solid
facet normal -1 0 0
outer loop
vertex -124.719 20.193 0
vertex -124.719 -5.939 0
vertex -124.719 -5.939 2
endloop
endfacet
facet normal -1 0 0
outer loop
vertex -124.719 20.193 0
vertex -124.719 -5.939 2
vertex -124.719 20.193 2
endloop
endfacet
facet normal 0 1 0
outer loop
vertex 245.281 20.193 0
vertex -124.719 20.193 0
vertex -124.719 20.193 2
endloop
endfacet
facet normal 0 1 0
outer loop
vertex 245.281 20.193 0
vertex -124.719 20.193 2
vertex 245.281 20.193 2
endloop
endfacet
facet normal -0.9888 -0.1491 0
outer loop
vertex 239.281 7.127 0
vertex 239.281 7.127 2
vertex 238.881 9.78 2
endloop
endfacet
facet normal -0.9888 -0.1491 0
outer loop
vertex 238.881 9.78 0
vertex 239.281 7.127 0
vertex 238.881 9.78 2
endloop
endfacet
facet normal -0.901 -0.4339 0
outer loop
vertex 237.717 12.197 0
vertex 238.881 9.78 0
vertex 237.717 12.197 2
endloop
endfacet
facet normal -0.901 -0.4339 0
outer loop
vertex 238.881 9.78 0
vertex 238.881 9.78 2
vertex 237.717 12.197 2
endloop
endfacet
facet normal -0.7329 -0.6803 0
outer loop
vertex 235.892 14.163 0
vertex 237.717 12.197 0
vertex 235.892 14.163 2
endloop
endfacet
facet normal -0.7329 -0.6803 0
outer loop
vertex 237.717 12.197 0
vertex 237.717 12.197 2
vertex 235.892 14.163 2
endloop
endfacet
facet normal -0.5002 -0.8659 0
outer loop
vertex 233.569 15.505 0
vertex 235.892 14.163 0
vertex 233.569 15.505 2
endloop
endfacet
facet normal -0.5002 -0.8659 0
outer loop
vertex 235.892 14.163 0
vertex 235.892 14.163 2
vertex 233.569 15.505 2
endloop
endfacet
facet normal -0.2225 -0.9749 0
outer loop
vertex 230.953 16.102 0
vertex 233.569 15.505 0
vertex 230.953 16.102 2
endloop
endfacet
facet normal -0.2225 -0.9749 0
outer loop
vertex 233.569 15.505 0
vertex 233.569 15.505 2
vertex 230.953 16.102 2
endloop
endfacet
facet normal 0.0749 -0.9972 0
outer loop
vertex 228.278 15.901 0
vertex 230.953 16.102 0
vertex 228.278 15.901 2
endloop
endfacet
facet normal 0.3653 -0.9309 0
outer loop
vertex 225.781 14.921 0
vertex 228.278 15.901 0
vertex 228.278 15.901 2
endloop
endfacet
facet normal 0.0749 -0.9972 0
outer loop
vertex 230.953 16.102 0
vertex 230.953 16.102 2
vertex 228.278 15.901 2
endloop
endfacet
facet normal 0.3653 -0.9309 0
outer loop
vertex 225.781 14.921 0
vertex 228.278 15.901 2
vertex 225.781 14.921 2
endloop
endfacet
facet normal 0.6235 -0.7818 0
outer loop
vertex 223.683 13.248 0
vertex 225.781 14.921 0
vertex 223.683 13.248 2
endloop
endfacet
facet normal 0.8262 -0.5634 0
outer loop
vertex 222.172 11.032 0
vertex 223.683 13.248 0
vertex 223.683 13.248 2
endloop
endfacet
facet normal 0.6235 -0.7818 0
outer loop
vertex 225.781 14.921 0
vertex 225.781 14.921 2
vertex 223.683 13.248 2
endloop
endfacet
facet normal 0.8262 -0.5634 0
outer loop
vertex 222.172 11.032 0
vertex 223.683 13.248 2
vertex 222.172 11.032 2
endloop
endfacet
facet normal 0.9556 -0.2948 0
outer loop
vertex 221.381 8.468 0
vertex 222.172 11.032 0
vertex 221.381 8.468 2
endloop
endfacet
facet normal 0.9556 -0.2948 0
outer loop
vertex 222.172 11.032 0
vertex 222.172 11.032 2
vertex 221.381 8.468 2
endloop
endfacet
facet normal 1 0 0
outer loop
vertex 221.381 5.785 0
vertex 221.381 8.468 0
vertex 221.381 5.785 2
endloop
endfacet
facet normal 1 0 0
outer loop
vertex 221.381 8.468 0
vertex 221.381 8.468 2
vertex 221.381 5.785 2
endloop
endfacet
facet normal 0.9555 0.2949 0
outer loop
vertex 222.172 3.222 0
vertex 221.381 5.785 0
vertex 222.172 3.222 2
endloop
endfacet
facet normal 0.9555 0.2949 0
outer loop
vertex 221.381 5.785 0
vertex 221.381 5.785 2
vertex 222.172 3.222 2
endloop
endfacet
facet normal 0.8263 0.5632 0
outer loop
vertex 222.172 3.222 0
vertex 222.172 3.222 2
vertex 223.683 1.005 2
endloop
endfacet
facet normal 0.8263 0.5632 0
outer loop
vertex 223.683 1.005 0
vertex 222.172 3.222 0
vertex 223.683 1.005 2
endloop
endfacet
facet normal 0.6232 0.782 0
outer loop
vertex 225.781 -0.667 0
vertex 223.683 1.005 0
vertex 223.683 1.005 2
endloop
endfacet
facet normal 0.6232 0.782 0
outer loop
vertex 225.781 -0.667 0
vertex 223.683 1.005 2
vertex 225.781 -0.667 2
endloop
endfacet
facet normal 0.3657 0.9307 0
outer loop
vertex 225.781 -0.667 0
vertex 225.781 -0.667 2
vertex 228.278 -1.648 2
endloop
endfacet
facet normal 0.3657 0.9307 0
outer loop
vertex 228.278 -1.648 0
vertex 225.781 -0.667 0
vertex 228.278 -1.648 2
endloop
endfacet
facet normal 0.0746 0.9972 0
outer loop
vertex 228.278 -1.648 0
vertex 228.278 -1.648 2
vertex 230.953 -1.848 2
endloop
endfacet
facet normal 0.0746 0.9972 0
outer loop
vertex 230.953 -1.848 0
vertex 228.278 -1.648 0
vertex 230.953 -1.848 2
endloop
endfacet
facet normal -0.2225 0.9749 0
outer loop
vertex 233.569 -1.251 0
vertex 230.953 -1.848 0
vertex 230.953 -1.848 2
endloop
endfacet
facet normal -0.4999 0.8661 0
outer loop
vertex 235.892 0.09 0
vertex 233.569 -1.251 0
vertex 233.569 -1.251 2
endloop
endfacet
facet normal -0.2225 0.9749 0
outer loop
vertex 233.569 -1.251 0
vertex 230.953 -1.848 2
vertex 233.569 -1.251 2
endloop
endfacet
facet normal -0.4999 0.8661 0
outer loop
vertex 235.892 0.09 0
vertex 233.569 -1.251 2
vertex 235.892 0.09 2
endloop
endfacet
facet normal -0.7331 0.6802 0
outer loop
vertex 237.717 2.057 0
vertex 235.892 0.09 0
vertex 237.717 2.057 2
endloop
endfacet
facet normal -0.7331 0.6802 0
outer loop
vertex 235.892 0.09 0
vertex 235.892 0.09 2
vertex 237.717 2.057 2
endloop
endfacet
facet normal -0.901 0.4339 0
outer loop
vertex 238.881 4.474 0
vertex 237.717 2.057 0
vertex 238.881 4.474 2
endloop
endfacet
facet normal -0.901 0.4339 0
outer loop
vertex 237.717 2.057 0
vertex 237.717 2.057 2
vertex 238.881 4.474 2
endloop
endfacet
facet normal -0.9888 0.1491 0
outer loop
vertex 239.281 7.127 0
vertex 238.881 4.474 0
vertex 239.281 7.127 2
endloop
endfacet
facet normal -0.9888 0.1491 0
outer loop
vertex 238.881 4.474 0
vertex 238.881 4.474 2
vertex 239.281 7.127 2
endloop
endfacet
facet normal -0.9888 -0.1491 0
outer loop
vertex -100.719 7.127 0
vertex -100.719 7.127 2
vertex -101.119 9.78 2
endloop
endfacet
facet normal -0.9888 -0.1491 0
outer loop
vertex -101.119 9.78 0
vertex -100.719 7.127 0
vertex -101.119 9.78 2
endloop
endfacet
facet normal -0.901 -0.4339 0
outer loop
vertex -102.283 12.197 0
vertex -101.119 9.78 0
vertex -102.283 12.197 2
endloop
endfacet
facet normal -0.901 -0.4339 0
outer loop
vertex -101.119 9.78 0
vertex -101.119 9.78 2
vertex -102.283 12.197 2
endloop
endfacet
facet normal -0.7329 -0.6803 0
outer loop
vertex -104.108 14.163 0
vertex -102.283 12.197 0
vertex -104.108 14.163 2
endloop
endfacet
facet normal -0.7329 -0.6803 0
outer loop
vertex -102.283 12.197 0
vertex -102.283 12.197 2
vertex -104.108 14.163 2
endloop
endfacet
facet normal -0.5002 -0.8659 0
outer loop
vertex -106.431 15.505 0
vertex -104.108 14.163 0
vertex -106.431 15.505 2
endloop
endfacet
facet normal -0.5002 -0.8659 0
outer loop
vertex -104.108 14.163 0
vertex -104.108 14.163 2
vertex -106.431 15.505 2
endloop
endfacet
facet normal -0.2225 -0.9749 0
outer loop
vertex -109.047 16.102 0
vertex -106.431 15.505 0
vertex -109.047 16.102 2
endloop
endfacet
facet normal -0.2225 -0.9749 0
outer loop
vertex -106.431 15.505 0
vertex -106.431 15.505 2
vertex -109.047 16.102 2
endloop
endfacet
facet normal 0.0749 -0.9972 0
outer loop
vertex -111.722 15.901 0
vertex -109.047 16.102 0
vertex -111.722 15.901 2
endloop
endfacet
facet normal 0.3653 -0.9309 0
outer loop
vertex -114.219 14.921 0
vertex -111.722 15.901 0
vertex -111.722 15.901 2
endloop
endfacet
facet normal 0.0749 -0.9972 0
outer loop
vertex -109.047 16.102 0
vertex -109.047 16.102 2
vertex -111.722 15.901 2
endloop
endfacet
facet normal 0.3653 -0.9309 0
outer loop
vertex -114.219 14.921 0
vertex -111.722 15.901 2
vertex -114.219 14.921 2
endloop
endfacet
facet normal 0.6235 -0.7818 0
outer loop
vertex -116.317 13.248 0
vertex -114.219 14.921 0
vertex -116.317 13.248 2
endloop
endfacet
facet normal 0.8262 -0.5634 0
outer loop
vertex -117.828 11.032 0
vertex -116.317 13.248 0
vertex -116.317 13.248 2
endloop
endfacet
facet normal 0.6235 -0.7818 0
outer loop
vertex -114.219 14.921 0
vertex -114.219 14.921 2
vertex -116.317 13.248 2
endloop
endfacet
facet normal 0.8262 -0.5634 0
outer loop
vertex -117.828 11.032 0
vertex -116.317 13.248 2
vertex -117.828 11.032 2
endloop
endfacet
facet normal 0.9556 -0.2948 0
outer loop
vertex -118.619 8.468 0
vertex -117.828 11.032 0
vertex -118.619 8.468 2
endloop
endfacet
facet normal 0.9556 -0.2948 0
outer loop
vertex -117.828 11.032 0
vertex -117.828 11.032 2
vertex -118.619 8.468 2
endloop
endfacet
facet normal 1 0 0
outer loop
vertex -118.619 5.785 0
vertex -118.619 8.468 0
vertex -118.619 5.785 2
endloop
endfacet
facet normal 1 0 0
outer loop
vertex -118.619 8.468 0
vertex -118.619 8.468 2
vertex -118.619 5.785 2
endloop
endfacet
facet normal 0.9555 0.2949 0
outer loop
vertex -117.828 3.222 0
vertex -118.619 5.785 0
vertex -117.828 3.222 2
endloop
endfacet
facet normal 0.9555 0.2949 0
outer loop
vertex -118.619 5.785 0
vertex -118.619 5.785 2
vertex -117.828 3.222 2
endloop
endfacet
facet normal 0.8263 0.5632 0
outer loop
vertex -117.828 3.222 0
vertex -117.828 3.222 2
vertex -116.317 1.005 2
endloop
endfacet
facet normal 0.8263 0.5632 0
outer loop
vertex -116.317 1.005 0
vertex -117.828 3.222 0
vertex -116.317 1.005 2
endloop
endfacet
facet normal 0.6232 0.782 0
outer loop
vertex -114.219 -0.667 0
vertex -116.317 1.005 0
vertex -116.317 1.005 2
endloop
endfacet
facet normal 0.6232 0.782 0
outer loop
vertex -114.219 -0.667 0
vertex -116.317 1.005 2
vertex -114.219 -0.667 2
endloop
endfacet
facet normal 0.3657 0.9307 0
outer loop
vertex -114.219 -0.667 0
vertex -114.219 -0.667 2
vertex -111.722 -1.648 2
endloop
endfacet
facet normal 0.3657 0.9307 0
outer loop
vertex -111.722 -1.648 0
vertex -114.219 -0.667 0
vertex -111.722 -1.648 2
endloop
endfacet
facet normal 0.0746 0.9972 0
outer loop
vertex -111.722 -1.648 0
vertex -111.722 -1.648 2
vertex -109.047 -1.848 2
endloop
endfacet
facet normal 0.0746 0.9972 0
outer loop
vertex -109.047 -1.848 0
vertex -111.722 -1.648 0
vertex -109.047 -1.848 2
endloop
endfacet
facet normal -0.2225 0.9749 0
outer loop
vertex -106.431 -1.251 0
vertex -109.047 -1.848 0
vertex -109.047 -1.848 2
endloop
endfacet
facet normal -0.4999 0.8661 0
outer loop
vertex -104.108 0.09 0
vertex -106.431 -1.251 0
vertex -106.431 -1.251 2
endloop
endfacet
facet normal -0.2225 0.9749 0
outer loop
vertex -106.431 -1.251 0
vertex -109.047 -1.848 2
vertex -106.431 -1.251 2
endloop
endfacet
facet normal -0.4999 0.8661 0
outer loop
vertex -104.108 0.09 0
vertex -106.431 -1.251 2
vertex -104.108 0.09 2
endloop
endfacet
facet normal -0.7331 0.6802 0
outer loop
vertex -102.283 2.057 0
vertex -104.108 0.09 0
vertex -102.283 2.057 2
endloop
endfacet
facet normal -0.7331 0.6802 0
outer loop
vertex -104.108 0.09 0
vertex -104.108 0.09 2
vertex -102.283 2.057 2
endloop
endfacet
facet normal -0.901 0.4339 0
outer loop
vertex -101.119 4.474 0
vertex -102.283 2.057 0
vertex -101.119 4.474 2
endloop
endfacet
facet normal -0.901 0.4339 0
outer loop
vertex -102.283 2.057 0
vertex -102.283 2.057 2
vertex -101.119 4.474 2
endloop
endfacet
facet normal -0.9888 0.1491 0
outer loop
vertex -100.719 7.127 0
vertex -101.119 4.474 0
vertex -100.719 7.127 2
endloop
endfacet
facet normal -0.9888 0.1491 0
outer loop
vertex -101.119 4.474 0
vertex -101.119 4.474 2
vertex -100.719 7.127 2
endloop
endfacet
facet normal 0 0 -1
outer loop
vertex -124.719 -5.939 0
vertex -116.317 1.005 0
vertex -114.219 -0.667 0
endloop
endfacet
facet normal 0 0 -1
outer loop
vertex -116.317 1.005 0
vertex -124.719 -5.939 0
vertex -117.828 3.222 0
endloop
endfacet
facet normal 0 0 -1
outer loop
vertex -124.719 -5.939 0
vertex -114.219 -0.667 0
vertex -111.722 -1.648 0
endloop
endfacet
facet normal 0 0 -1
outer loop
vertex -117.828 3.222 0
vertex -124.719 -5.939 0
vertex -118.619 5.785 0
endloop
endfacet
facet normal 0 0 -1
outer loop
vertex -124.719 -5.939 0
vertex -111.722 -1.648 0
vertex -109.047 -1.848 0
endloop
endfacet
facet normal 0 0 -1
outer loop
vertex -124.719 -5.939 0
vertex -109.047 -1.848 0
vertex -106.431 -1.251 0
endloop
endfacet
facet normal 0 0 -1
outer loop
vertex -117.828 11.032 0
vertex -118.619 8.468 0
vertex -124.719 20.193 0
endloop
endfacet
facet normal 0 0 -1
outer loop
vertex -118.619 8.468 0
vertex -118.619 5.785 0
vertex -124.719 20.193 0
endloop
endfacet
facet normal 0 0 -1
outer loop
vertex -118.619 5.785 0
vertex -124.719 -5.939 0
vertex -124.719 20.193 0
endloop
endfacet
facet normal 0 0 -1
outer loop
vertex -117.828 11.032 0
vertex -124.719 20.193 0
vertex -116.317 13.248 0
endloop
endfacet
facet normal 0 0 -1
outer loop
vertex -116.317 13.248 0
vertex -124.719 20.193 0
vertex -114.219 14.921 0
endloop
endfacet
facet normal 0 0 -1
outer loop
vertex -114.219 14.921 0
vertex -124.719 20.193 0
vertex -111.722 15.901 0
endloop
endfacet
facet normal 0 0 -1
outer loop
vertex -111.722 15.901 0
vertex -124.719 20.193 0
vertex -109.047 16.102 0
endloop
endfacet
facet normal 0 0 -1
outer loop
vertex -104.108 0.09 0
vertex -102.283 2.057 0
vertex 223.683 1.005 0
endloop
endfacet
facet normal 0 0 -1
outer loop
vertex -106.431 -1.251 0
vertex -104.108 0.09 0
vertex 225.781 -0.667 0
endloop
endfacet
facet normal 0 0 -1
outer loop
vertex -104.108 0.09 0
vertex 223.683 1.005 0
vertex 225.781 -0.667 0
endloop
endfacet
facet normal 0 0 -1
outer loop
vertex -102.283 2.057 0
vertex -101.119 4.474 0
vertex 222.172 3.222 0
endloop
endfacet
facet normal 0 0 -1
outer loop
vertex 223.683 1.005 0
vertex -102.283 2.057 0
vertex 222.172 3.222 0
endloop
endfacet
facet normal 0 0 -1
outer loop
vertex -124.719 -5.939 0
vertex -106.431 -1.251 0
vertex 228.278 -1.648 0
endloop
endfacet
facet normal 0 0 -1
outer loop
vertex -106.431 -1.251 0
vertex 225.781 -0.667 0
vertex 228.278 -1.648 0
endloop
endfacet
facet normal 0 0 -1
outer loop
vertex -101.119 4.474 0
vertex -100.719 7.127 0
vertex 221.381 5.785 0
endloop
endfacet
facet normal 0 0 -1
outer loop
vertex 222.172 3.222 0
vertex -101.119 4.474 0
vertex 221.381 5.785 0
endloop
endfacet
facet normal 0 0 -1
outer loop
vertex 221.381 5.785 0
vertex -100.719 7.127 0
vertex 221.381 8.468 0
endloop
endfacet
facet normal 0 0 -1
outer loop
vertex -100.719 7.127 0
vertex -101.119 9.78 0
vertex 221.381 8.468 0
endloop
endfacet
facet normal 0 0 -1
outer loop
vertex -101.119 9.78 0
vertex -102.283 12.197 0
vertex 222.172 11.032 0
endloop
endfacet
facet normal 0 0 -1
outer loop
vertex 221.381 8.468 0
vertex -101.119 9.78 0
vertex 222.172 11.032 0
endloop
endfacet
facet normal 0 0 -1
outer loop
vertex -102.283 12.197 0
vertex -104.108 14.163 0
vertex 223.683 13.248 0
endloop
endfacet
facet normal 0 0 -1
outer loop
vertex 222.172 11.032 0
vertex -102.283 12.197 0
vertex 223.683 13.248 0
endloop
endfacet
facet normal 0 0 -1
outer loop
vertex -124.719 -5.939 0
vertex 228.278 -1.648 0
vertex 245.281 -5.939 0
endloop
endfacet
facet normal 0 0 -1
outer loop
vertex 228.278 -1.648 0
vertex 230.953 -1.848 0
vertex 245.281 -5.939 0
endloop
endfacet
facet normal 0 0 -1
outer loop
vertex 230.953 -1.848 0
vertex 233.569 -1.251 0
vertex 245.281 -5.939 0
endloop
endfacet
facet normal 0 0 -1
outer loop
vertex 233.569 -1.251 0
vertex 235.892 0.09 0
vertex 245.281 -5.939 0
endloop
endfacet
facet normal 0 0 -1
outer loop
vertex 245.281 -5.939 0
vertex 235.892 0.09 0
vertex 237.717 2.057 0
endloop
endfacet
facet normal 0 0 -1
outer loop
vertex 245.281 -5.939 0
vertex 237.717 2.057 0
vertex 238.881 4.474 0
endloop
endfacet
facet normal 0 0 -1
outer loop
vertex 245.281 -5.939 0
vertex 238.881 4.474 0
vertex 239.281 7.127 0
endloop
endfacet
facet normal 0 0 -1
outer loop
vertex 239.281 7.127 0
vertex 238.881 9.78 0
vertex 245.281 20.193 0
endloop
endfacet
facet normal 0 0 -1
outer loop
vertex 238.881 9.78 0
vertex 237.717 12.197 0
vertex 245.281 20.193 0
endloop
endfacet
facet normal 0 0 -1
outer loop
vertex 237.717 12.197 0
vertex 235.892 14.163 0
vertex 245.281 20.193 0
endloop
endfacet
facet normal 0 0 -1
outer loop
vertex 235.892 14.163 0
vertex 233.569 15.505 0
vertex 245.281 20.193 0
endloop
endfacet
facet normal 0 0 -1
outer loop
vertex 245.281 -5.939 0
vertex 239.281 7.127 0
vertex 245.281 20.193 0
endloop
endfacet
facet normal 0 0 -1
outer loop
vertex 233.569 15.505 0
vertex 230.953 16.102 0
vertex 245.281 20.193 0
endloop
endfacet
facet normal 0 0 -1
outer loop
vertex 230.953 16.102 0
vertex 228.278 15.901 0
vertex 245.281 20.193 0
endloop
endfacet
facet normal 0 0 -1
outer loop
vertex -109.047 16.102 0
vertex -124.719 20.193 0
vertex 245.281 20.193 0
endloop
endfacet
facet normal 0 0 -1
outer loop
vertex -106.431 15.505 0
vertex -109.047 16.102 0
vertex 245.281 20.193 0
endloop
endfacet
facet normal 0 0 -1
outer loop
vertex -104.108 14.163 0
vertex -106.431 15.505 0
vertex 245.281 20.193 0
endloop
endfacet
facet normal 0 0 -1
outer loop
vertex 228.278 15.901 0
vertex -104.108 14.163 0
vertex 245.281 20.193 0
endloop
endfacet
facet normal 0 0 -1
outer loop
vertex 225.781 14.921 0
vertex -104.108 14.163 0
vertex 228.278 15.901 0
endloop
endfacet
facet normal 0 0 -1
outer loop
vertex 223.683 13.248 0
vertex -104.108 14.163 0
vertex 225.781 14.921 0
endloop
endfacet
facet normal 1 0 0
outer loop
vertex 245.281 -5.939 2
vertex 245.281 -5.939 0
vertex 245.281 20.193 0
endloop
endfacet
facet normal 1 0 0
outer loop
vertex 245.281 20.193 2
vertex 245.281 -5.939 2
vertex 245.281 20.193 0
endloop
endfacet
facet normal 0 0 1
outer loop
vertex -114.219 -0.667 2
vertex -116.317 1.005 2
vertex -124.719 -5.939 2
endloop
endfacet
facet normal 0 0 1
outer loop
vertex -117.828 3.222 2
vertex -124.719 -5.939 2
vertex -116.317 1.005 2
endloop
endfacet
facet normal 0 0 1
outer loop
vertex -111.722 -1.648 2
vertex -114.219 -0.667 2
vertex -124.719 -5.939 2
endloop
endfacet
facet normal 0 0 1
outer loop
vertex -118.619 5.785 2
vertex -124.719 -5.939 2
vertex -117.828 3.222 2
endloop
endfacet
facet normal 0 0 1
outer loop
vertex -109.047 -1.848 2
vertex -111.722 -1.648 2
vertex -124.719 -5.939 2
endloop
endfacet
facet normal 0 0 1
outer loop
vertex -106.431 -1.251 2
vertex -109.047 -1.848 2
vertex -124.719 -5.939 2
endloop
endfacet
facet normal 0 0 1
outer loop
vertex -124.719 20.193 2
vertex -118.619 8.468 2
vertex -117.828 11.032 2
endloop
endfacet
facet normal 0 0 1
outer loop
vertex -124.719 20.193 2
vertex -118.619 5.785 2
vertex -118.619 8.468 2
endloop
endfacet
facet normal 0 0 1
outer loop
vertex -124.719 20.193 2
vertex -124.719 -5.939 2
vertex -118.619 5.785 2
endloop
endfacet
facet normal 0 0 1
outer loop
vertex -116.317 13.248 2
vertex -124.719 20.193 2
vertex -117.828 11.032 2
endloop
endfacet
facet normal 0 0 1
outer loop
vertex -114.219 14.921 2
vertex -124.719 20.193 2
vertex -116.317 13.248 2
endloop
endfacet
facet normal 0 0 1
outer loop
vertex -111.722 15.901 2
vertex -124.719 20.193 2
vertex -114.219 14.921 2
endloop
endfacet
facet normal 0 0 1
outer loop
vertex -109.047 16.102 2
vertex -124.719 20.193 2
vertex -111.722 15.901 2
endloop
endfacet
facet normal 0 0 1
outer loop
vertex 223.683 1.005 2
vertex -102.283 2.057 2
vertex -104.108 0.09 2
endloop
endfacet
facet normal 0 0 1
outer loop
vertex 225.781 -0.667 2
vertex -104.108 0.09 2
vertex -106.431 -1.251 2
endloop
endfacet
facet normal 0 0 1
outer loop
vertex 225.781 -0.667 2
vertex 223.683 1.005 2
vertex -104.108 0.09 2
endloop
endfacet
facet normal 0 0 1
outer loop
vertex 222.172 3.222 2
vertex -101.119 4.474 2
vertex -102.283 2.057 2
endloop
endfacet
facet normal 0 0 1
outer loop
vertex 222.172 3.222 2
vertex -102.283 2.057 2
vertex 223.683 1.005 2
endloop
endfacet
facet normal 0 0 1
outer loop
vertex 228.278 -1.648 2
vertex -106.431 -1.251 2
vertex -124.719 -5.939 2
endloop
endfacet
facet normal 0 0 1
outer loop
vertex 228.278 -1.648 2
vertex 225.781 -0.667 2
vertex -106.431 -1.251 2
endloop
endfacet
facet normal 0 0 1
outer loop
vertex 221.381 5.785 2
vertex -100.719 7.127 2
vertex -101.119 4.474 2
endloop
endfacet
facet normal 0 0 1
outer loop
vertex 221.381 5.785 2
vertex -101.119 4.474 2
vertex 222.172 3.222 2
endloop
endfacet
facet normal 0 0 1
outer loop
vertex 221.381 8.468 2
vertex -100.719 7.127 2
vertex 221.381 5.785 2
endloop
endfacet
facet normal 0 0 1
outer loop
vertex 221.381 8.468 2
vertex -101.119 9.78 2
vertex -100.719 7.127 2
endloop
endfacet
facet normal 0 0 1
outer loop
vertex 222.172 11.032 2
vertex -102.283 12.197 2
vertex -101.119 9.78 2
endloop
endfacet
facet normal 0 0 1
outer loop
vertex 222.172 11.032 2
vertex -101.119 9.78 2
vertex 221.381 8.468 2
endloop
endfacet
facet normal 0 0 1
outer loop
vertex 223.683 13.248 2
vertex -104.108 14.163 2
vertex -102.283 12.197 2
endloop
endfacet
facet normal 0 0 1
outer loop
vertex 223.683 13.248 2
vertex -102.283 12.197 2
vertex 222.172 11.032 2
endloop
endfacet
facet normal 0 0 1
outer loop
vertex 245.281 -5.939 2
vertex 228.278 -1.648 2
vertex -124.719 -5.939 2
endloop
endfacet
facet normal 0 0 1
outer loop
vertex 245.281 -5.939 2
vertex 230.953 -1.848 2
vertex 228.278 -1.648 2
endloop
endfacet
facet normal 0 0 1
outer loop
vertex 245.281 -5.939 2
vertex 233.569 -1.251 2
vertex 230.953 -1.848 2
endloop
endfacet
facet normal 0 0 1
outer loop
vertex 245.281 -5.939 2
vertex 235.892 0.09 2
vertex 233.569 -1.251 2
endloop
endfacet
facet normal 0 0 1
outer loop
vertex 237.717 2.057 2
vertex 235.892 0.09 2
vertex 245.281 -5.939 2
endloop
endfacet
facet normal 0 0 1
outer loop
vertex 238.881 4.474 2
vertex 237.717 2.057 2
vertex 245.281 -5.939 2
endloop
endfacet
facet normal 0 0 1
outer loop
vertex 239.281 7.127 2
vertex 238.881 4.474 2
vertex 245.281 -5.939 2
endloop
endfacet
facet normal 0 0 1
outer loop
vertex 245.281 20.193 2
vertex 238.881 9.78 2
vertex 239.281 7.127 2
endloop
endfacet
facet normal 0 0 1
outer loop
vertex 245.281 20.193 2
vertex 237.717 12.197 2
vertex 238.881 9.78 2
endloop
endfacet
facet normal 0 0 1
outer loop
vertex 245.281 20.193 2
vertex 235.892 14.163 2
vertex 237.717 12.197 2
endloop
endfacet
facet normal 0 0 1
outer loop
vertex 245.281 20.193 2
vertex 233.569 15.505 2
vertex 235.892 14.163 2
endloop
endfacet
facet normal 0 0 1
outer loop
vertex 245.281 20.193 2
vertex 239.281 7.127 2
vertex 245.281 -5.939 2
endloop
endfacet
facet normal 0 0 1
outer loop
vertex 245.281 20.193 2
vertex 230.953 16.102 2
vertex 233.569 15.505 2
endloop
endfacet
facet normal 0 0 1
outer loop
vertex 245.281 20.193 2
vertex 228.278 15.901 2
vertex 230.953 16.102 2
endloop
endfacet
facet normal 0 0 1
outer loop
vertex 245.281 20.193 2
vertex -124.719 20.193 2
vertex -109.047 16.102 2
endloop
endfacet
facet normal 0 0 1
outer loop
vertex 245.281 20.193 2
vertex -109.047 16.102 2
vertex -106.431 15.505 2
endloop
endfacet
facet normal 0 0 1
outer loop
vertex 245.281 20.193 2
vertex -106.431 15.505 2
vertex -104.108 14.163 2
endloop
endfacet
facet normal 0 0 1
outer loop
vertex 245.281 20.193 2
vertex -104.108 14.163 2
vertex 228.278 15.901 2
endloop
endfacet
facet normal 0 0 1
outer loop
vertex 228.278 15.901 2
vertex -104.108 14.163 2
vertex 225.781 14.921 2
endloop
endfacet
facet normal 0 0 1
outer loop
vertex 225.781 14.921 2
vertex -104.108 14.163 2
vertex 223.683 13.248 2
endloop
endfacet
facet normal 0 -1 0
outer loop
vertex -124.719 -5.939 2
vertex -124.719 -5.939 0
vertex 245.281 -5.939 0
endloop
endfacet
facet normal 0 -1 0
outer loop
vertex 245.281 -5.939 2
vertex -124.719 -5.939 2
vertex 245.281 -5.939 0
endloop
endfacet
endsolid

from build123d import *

# Parameters (mm, degrees)
SKETCH1_W           = 370
SKETCH1_H           = 26.131621187
BOSS_EXTRUDE1_DEPTH = 2
SKETCH2_R           = 9
CUT_EXTRUDE1_DEPTH  = 2
SKETCH2_4_R         = 9
CUT_EXTRUDE2_DEPTH  = 2


with BuildPart() as part:
    # Sketch1 → Boss-Extrude1 (new body)
    with BuildSketch(Plane.XY):
        with Locations((60.280898876, 7.126805778)):
            Rectangle(SKETCH1_W, SKETCH1_H)
    extrude(amount=BOSS_EXTRUDE1_DEPTH)

    # Sketch2 → Cut-Extrude1 (cut)
    with BuildSketch(Plane.XY.offset(2)):
        with Locations((-109.719101124, 7.126805778)):
            Circle(SKETCH2_R)
    extrude(amount=-CUT_EXTRUDE1_DEPTH, mode=Mode.SUBTRACT)

    # Sketch2<4> → Cut-Extrude2 (cut)
    with BuildSketch(Plane.XY.offset(2)):
        with Locations((-109.719101124, 7.126805778)):
            Circle(SKETCH2_4_R)
        with Locations((230.280898876, 7.126805778)):
            Circle(SKETCH2_4_R)
    extrude(amount=-CUT_EXTRUDE2_DEPTH, mode=Mode.SUBTRACT)


solid = part.part
